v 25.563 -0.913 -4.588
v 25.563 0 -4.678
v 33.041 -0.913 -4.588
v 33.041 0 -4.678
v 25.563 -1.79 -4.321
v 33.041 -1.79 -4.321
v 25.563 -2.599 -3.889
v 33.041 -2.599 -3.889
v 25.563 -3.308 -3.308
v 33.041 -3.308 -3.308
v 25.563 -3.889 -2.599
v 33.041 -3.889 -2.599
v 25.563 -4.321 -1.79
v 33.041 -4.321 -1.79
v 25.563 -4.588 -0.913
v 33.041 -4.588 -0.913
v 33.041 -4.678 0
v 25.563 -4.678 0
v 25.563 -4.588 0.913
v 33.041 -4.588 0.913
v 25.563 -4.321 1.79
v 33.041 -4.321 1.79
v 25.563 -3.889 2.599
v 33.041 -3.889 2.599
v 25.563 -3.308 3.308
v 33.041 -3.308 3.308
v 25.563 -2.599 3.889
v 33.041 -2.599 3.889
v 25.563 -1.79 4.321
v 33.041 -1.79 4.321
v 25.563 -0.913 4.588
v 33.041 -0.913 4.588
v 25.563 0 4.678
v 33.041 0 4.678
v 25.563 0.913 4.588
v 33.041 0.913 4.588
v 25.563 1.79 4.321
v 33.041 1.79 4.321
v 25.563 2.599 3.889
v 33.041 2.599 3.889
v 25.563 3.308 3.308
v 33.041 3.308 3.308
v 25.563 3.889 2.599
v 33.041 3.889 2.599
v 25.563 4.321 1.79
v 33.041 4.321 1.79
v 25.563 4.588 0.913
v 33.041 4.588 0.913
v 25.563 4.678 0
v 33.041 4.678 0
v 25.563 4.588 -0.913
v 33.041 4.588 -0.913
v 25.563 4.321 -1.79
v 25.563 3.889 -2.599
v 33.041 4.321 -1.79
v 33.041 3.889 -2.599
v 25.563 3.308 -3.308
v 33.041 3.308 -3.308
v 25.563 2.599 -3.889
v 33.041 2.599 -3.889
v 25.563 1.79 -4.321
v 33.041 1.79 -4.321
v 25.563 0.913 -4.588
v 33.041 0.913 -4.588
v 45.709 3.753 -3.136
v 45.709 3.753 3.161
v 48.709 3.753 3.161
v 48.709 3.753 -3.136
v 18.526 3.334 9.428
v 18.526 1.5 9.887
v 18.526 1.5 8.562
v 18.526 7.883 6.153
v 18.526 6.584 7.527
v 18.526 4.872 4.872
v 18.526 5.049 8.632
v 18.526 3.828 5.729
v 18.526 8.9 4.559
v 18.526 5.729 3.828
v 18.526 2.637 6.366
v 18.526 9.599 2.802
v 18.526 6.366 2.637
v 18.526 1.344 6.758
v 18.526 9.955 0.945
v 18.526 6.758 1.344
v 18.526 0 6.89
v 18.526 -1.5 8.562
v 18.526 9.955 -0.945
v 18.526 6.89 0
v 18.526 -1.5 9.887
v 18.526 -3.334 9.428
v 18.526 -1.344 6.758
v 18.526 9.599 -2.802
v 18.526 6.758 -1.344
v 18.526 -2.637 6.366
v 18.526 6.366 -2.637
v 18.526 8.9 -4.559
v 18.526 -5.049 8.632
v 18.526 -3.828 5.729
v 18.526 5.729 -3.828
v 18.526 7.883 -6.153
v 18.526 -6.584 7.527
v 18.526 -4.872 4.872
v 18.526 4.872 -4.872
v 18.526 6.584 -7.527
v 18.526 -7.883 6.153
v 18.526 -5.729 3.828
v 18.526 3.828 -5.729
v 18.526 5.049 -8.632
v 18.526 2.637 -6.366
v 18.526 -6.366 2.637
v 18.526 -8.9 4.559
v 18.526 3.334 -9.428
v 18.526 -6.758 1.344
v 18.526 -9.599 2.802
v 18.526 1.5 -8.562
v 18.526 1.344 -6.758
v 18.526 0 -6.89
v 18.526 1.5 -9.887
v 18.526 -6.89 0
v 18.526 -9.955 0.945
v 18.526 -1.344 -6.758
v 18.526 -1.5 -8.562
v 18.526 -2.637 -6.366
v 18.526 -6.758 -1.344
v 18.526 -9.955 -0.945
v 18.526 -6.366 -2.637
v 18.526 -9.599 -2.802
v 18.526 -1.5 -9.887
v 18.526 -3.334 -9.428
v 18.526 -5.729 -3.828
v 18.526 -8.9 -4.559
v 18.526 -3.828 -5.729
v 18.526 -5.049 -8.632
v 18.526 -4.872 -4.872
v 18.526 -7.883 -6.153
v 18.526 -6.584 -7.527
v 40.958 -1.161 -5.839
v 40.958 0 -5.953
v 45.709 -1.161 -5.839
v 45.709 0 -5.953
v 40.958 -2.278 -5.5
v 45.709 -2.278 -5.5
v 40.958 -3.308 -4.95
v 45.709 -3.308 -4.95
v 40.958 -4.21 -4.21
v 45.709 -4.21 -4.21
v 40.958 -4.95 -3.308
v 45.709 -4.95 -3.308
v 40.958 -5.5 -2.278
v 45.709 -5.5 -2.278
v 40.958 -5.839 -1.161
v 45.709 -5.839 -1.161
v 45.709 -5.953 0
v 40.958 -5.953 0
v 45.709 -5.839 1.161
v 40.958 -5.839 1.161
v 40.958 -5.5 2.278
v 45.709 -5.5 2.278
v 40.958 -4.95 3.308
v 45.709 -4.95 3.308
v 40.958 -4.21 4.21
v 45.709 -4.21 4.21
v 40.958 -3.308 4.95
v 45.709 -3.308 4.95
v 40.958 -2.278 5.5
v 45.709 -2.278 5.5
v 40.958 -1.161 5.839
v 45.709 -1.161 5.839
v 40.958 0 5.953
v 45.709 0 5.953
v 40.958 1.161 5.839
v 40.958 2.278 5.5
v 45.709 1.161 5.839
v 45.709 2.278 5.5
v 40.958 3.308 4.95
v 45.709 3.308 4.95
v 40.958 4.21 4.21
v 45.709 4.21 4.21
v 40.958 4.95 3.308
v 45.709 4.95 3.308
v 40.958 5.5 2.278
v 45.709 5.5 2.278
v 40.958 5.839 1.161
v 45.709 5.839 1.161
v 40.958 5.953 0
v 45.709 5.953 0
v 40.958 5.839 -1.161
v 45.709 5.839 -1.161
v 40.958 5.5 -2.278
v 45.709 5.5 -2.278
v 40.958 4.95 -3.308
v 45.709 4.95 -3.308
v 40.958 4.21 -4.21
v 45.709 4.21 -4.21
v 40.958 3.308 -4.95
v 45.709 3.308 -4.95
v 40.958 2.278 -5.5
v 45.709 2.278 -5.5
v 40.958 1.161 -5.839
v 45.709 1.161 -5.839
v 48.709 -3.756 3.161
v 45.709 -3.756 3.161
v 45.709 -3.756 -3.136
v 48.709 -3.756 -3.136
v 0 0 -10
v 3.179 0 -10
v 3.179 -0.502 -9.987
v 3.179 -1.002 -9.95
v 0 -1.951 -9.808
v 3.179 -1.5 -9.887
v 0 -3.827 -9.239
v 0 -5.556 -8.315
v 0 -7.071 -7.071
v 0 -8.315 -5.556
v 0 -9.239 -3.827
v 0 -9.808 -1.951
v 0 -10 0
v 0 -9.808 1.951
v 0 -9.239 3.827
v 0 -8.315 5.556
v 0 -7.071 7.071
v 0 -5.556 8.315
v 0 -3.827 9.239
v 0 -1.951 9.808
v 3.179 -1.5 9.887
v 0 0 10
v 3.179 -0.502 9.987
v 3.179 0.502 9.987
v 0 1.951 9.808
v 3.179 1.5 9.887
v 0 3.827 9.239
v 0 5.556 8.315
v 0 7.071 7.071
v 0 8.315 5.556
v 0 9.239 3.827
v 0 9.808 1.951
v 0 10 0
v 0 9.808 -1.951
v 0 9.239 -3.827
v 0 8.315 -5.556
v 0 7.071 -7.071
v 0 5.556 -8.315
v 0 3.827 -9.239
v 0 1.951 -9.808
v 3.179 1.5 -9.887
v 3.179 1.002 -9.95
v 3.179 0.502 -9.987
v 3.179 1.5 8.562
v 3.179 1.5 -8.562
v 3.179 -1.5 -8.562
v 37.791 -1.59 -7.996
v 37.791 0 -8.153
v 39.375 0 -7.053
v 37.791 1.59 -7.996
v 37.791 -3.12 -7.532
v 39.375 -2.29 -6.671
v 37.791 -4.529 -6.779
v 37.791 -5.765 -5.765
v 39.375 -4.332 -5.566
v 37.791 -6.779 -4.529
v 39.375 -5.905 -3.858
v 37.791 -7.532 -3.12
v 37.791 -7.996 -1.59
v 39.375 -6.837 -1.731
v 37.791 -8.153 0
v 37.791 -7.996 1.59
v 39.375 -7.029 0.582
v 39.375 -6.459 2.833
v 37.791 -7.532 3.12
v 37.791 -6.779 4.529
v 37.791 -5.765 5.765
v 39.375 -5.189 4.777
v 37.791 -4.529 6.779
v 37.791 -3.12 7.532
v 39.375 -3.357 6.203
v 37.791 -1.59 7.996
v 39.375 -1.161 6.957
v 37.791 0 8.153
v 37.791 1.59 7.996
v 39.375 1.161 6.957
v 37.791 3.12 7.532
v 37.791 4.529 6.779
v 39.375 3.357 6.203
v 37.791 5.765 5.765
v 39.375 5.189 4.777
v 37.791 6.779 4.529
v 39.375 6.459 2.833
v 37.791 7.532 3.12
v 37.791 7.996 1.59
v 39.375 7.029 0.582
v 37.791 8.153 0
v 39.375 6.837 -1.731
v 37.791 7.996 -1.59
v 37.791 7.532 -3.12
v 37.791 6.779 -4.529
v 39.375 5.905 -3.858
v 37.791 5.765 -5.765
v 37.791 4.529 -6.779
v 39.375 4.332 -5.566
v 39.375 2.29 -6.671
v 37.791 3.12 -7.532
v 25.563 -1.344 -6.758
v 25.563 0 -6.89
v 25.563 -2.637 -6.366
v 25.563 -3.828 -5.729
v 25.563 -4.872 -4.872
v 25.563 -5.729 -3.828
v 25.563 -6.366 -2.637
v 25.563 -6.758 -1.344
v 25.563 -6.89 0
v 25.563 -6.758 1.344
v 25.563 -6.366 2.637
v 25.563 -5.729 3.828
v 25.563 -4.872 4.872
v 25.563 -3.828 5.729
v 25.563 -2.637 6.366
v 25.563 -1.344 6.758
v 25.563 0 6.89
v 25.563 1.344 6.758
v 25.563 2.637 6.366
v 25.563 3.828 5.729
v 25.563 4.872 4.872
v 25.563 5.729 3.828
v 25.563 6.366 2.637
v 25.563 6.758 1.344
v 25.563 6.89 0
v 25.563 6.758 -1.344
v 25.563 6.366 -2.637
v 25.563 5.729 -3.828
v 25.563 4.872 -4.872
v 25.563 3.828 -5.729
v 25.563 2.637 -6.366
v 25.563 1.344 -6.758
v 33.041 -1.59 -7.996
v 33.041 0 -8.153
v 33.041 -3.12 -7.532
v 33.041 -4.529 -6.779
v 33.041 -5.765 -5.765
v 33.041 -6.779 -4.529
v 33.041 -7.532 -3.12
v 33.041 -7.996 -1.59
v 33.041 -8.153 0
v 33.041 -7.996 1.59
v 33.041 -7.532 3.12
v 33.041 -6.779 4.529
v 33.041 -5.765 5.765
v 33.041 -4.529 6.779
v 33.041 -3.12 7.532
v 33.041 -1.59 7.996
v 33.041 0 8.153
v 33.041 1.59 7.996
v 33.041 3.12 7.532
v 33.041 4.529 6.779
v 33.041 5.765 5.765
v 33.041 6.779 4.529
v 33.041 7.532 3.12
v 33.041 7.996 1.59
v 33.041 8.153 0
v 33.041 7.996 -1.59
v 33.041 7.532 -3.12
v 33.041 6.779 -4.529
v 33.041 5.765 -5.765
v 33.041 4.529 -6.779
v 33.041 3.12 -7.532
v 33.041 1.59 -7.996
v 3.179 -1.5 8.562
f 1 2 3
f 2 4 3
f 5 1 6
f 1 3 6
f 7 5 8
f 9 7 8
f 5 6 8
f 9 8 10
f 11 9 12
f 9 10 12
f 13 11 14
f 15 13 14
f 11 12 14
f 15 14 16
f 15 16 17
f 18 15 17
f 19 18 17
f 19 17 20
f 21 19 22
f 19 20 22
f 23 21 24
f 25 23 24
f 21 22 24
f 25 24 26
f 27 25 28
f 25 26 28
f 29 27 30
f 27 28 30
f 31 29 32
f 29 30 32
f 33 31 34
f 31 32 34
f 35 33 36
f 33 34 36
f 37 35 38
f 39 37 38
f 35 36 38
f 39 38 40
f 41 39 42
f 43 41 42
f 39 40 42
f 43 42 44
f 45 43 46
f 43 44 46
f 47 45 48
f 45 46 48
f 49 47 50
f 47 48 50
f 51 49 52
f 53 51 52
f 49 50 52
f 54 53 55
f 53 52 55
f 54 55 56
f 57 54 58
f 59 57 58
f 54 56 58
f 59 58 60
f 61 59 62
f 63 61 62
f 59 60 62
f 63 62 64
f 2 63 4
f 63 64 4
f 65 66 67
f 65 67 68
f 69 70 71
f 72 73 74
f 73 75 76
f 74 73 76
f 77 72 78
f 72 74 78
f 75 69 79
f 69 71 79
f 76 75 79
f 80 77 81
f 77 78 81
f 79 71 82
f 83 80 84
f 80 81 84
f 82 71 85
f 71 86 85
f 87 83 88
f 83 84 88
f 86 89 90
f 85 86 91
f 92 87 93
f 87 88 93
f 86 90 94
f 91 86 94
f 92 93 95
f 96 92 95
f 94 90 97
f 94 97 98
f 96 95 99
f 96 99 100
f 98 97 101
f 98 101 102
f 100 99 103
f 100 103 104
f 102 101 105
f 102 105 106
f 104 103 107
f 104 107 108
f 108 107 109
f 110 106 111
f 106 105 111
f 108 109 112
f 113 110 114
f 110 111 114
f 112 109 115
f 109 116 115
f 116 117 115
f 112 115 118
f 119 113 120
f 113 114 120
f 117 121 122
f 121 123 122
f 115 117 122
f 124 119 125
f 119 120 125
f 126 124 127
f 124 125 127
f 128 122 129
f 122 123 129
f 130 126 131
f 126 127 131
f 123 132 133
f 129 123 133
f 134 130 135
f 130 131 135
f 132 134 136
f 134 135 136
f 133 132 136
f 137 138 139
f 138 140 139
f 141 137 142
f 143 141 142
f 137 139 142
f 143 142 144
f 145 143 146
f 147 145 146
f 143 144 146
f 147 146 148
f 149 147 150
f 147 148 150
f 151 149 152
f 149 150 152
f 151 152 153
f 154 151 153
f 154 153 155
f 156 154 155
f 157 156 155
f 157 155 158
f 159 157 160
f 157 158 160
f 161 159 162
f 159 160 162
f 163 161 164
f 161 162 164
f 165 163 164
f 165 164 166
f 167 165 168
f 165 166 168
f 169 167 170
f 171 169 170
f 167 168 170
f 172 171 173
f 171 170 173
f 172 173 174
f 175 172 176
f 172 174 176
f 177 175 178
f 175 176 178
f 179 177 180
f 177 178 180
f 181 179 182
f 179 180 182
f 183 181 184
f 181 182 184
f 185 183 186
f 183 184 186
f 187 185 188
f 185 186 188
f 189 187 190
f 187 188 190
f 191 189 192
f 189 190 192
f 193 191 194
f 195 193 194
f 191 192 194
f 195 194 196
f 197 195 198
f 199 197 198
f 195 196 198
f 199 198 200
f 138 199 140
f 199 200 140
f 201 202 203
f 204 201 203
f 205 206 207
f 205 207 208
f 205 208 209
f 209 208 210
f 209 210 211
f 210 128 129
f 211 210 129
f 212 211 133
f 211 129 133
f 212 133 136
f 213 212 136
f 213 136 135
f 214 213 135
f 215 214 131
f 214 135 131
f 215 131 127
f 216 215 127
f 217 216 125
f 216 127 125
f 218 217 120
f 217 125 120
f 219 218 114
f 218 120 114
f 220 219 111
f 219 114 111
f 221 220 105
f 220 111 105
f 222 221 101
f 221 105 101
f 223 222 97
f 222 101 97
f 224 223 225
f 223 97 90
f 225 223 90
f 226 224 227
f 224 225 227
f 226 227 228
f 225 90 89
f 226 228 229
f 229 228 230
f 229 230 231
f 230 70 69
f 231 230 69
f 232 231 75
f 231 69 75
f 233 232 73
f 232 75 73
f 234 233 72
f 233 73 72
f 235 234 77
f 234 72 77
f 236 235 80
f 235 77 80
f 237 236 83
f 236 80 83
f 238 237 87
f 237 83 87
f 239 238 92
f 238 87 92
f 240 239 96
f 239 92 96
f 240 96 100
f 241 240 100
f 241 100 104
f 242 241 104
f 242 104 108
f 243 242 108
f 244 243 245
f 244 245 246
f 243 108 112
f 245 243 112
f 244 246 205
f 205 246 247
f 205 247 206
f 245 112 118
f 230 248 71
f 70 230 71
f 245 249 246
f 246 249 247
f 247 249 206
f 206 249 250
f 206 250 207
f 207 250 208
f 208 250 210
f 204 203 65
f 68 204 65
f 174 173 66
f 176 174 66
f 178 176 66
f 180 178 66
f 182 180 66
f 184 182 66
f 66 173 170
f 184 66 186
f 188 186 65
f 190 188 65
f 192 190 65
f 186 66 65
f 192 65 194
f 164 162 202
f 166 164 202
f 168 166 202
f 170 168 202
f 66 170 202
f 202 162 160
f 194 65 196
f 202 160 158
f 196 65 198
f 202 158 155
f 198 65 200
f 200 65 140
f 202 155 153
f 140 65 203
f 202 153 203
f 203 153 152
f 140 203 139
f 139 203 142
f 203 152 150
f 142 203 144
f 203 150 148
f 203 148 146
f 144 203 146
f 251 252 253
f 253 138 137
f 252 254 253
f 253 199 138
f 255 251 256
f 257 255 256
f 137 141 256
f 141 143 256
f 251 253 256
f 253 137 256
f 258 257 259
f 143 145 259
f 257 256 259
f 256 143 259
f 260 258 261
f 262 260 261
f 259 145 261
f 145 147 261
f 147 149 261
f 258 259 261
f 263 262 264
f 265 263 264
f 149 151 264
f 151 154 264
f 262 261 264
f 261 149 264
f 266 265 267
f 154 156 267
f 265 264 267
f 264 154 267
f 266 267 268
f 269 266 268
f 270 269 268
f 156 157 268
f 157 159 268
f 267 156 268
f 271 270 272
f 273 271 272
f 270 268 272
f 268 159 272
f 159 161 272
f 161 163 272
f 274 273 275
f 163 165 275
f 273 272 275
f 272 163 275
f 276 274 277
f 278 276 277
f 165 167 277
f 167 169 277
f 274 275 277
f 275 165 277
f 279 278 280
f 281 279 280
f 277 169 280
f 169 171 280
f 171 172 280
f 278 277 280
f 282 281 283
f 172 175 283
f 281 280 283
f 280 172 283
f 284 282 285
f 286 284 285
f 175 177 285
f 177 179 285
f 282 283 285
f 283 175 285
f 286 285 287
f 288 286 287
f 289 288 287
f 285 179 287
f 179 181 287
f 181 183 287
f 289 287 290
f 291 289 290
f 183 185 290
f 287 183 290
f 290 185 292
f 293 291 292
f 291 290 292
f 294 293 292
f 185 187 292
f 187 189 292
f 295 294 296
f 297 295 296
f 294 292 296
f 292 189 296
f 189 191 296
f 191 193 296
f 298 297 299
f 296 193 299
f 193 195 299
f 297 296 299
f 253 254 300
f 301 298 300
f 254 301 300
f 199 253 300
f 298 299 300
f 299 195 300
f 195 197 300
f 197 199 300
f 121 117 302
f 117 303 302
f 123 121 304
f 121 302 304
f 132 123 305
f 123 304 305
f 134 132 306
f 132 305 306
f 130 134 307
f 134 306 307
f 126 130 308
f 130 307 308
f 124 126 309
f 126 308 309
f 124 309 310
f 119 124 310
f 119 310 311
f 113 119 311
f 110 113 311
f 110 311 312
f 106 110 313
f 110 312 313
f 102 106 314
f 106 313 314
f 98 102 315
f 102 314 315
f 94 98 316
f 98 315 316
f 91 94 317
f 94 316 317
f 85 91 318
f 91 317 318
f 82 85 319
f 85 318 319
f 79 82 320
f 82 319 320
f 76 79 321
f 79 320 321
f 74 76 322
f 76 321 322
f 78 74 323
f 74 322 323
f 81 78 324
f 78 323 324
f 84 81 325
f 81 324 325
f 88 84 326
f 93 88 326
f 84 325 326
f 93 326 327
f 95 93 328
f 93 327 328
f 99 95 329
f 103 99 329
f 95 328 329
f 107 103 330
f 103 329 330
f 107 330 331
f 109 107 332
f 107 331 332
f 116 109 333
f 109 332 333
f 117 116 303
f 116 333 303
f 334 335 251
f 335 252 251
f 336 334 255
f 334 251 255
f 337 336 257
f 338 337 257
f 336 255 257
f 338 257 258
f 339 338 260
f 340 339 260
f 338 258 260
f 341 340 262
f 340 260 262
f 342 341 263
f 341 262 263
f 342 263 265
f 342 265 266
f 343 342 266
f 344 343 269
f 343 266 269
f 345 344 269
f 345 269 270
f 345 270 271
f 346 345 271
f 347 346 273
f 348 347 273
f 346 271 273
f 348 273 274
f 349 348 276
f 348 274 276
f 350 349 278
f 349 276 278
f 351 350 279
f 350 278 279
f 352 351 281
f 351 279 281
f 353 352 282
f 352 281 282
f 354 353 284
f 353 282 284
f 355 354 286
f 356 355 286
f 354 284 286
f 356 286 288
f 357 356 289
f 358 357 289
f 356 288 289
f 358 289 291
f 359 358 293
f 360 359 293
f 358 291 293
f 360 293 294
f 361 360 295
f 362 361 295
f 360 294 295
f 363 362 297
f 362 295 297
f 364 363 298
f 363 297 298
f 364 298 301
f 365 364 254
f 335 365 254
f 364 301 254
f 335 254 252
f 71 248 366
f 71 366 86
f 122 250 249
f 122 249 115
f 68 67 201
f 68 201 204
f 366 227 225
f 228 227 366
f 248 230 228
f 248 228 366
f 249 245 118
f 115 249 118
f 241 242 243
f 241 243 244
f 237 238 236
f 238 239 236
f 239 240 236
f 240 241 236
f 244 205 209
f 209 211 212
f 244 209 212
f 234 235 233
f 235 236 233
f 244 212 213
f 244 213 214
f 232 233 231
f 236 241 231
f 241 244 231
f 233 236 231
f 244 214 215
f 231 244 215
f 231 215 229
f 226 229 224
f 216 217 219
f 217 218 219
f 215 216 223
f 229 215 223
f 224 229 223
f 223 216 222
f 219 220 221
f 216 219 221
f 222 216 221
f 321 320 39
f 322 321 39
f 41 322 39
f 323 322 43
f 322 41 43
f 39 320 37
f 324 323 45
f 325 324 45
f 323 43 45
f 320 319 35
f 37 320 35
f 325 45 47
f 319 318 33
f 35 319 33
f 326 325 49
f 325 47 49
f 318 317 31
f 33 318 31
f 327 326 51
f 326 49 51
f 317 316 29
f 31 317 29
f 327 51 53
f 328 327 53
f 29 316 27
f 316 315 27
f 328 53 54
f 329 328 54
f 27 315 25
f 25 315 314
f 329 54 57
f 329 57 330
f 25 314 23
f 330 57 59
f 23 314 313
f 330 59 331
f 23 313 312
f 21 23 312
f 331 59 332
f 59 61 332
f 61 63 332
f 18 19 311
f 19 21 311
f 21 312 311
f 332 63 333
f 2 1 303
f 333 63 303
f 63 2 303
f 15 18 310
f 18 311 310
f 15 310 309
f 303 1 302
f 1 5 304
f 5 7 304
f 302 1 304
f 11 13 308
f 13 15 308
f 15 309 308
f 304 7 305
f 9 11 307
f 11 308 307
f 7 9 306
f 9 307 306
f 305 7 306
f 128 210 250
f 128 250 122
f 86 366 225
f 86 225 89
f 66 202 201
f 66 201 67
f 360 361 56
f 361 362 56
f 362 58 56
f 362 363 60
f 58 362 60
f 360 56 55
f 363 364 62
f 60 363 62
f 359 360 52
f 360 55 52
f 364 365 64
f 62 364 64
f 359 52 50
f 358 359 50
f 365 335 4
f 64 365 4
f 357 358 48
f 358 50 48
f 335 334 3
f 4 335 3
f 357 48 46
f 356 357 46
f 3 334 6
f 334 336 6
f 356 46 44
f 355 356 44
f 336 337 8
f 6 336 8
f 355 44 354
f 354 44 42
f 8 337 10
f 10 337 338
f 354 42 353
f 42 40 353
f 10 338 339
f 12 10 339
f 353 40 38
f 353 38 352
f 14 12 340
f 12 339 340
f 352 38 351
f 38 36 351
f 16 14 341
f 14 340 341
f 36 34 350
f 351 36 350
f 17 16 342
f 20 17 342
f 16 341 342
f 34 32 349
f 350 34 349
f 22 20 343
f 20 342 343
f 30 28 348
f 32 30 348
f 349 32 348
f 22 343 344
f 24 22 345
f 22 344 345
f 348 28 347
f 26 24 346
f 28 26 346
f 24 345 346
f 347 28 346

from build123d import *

# Parameters (mm, degrees)
SKETCH2_W           = 17.886691146
SKETCH2_H           = 2.175460001
CUT_EXTRUDE1_DEPTH  = 1.5
SKETCH3_W           = 6.296857424
SKETCH3_H           = 7.509086661
BOSS_EXTRUDE1_DEPTH = 3


with BuildPart() as part:
    # Sketch1 → Revolve1 (revolve)
    with BuildSketch(Plane(origin=(0, 0, 0), x_dir=(1, 0, 0), z_dir=(0, 1, 0))):
        Polygon((0, 0), (0, 10), (18.52566279, 10), (18.52566279, 6.890240487), (25.563295531, 6.890240487), (25.563295531, 4.677528689), (33.040780318, 4.677528689), (33.040780318, 8.152621406), (37.791182418, 8.152621406), (40.958117151, 5.953361174), (45.708519251, 5.953361174), (45.708519251, 0), align=None)
    revolve(axis=Axis((45.708519251, 0, 0), (-1, 0, 0)))

    # Sketch2 → Cut-Extrude1 (cut, symmetric)
    with BuildSketch(Plane(origin=(0, 0, 0), x_dir=(1, 0, 0), z_dir=(0, 1, 0))):
        with Locations((12.122244938, 9.650117441)):
            Rectangle(SKETCH2_W, SKETCH2_H)
        with Locations((12.122244938, -9.650117441)):
            Rectangle(SKETCH2_W, SKETCH2_H)
    extrude(amount=CUT_EXTRUDE1_DEPTH, both=True, mode=Mode.SUBTRACT)

    # Sketch3 → Boss-Extrude1 (add)
    with BuildSketch(Plane(origin=(45.708519251, 0, 0), x_dir=(0, 0, -1), z_dir=(1, 0, 0))):
        with Locations((-0.012160705, -0.001203589)):
            Rectangle(SKETCH3_W, SKETCH3_H)
    extrude(amount=BOSS_EXTRUDE1_DEPTH)


solid = part.part
